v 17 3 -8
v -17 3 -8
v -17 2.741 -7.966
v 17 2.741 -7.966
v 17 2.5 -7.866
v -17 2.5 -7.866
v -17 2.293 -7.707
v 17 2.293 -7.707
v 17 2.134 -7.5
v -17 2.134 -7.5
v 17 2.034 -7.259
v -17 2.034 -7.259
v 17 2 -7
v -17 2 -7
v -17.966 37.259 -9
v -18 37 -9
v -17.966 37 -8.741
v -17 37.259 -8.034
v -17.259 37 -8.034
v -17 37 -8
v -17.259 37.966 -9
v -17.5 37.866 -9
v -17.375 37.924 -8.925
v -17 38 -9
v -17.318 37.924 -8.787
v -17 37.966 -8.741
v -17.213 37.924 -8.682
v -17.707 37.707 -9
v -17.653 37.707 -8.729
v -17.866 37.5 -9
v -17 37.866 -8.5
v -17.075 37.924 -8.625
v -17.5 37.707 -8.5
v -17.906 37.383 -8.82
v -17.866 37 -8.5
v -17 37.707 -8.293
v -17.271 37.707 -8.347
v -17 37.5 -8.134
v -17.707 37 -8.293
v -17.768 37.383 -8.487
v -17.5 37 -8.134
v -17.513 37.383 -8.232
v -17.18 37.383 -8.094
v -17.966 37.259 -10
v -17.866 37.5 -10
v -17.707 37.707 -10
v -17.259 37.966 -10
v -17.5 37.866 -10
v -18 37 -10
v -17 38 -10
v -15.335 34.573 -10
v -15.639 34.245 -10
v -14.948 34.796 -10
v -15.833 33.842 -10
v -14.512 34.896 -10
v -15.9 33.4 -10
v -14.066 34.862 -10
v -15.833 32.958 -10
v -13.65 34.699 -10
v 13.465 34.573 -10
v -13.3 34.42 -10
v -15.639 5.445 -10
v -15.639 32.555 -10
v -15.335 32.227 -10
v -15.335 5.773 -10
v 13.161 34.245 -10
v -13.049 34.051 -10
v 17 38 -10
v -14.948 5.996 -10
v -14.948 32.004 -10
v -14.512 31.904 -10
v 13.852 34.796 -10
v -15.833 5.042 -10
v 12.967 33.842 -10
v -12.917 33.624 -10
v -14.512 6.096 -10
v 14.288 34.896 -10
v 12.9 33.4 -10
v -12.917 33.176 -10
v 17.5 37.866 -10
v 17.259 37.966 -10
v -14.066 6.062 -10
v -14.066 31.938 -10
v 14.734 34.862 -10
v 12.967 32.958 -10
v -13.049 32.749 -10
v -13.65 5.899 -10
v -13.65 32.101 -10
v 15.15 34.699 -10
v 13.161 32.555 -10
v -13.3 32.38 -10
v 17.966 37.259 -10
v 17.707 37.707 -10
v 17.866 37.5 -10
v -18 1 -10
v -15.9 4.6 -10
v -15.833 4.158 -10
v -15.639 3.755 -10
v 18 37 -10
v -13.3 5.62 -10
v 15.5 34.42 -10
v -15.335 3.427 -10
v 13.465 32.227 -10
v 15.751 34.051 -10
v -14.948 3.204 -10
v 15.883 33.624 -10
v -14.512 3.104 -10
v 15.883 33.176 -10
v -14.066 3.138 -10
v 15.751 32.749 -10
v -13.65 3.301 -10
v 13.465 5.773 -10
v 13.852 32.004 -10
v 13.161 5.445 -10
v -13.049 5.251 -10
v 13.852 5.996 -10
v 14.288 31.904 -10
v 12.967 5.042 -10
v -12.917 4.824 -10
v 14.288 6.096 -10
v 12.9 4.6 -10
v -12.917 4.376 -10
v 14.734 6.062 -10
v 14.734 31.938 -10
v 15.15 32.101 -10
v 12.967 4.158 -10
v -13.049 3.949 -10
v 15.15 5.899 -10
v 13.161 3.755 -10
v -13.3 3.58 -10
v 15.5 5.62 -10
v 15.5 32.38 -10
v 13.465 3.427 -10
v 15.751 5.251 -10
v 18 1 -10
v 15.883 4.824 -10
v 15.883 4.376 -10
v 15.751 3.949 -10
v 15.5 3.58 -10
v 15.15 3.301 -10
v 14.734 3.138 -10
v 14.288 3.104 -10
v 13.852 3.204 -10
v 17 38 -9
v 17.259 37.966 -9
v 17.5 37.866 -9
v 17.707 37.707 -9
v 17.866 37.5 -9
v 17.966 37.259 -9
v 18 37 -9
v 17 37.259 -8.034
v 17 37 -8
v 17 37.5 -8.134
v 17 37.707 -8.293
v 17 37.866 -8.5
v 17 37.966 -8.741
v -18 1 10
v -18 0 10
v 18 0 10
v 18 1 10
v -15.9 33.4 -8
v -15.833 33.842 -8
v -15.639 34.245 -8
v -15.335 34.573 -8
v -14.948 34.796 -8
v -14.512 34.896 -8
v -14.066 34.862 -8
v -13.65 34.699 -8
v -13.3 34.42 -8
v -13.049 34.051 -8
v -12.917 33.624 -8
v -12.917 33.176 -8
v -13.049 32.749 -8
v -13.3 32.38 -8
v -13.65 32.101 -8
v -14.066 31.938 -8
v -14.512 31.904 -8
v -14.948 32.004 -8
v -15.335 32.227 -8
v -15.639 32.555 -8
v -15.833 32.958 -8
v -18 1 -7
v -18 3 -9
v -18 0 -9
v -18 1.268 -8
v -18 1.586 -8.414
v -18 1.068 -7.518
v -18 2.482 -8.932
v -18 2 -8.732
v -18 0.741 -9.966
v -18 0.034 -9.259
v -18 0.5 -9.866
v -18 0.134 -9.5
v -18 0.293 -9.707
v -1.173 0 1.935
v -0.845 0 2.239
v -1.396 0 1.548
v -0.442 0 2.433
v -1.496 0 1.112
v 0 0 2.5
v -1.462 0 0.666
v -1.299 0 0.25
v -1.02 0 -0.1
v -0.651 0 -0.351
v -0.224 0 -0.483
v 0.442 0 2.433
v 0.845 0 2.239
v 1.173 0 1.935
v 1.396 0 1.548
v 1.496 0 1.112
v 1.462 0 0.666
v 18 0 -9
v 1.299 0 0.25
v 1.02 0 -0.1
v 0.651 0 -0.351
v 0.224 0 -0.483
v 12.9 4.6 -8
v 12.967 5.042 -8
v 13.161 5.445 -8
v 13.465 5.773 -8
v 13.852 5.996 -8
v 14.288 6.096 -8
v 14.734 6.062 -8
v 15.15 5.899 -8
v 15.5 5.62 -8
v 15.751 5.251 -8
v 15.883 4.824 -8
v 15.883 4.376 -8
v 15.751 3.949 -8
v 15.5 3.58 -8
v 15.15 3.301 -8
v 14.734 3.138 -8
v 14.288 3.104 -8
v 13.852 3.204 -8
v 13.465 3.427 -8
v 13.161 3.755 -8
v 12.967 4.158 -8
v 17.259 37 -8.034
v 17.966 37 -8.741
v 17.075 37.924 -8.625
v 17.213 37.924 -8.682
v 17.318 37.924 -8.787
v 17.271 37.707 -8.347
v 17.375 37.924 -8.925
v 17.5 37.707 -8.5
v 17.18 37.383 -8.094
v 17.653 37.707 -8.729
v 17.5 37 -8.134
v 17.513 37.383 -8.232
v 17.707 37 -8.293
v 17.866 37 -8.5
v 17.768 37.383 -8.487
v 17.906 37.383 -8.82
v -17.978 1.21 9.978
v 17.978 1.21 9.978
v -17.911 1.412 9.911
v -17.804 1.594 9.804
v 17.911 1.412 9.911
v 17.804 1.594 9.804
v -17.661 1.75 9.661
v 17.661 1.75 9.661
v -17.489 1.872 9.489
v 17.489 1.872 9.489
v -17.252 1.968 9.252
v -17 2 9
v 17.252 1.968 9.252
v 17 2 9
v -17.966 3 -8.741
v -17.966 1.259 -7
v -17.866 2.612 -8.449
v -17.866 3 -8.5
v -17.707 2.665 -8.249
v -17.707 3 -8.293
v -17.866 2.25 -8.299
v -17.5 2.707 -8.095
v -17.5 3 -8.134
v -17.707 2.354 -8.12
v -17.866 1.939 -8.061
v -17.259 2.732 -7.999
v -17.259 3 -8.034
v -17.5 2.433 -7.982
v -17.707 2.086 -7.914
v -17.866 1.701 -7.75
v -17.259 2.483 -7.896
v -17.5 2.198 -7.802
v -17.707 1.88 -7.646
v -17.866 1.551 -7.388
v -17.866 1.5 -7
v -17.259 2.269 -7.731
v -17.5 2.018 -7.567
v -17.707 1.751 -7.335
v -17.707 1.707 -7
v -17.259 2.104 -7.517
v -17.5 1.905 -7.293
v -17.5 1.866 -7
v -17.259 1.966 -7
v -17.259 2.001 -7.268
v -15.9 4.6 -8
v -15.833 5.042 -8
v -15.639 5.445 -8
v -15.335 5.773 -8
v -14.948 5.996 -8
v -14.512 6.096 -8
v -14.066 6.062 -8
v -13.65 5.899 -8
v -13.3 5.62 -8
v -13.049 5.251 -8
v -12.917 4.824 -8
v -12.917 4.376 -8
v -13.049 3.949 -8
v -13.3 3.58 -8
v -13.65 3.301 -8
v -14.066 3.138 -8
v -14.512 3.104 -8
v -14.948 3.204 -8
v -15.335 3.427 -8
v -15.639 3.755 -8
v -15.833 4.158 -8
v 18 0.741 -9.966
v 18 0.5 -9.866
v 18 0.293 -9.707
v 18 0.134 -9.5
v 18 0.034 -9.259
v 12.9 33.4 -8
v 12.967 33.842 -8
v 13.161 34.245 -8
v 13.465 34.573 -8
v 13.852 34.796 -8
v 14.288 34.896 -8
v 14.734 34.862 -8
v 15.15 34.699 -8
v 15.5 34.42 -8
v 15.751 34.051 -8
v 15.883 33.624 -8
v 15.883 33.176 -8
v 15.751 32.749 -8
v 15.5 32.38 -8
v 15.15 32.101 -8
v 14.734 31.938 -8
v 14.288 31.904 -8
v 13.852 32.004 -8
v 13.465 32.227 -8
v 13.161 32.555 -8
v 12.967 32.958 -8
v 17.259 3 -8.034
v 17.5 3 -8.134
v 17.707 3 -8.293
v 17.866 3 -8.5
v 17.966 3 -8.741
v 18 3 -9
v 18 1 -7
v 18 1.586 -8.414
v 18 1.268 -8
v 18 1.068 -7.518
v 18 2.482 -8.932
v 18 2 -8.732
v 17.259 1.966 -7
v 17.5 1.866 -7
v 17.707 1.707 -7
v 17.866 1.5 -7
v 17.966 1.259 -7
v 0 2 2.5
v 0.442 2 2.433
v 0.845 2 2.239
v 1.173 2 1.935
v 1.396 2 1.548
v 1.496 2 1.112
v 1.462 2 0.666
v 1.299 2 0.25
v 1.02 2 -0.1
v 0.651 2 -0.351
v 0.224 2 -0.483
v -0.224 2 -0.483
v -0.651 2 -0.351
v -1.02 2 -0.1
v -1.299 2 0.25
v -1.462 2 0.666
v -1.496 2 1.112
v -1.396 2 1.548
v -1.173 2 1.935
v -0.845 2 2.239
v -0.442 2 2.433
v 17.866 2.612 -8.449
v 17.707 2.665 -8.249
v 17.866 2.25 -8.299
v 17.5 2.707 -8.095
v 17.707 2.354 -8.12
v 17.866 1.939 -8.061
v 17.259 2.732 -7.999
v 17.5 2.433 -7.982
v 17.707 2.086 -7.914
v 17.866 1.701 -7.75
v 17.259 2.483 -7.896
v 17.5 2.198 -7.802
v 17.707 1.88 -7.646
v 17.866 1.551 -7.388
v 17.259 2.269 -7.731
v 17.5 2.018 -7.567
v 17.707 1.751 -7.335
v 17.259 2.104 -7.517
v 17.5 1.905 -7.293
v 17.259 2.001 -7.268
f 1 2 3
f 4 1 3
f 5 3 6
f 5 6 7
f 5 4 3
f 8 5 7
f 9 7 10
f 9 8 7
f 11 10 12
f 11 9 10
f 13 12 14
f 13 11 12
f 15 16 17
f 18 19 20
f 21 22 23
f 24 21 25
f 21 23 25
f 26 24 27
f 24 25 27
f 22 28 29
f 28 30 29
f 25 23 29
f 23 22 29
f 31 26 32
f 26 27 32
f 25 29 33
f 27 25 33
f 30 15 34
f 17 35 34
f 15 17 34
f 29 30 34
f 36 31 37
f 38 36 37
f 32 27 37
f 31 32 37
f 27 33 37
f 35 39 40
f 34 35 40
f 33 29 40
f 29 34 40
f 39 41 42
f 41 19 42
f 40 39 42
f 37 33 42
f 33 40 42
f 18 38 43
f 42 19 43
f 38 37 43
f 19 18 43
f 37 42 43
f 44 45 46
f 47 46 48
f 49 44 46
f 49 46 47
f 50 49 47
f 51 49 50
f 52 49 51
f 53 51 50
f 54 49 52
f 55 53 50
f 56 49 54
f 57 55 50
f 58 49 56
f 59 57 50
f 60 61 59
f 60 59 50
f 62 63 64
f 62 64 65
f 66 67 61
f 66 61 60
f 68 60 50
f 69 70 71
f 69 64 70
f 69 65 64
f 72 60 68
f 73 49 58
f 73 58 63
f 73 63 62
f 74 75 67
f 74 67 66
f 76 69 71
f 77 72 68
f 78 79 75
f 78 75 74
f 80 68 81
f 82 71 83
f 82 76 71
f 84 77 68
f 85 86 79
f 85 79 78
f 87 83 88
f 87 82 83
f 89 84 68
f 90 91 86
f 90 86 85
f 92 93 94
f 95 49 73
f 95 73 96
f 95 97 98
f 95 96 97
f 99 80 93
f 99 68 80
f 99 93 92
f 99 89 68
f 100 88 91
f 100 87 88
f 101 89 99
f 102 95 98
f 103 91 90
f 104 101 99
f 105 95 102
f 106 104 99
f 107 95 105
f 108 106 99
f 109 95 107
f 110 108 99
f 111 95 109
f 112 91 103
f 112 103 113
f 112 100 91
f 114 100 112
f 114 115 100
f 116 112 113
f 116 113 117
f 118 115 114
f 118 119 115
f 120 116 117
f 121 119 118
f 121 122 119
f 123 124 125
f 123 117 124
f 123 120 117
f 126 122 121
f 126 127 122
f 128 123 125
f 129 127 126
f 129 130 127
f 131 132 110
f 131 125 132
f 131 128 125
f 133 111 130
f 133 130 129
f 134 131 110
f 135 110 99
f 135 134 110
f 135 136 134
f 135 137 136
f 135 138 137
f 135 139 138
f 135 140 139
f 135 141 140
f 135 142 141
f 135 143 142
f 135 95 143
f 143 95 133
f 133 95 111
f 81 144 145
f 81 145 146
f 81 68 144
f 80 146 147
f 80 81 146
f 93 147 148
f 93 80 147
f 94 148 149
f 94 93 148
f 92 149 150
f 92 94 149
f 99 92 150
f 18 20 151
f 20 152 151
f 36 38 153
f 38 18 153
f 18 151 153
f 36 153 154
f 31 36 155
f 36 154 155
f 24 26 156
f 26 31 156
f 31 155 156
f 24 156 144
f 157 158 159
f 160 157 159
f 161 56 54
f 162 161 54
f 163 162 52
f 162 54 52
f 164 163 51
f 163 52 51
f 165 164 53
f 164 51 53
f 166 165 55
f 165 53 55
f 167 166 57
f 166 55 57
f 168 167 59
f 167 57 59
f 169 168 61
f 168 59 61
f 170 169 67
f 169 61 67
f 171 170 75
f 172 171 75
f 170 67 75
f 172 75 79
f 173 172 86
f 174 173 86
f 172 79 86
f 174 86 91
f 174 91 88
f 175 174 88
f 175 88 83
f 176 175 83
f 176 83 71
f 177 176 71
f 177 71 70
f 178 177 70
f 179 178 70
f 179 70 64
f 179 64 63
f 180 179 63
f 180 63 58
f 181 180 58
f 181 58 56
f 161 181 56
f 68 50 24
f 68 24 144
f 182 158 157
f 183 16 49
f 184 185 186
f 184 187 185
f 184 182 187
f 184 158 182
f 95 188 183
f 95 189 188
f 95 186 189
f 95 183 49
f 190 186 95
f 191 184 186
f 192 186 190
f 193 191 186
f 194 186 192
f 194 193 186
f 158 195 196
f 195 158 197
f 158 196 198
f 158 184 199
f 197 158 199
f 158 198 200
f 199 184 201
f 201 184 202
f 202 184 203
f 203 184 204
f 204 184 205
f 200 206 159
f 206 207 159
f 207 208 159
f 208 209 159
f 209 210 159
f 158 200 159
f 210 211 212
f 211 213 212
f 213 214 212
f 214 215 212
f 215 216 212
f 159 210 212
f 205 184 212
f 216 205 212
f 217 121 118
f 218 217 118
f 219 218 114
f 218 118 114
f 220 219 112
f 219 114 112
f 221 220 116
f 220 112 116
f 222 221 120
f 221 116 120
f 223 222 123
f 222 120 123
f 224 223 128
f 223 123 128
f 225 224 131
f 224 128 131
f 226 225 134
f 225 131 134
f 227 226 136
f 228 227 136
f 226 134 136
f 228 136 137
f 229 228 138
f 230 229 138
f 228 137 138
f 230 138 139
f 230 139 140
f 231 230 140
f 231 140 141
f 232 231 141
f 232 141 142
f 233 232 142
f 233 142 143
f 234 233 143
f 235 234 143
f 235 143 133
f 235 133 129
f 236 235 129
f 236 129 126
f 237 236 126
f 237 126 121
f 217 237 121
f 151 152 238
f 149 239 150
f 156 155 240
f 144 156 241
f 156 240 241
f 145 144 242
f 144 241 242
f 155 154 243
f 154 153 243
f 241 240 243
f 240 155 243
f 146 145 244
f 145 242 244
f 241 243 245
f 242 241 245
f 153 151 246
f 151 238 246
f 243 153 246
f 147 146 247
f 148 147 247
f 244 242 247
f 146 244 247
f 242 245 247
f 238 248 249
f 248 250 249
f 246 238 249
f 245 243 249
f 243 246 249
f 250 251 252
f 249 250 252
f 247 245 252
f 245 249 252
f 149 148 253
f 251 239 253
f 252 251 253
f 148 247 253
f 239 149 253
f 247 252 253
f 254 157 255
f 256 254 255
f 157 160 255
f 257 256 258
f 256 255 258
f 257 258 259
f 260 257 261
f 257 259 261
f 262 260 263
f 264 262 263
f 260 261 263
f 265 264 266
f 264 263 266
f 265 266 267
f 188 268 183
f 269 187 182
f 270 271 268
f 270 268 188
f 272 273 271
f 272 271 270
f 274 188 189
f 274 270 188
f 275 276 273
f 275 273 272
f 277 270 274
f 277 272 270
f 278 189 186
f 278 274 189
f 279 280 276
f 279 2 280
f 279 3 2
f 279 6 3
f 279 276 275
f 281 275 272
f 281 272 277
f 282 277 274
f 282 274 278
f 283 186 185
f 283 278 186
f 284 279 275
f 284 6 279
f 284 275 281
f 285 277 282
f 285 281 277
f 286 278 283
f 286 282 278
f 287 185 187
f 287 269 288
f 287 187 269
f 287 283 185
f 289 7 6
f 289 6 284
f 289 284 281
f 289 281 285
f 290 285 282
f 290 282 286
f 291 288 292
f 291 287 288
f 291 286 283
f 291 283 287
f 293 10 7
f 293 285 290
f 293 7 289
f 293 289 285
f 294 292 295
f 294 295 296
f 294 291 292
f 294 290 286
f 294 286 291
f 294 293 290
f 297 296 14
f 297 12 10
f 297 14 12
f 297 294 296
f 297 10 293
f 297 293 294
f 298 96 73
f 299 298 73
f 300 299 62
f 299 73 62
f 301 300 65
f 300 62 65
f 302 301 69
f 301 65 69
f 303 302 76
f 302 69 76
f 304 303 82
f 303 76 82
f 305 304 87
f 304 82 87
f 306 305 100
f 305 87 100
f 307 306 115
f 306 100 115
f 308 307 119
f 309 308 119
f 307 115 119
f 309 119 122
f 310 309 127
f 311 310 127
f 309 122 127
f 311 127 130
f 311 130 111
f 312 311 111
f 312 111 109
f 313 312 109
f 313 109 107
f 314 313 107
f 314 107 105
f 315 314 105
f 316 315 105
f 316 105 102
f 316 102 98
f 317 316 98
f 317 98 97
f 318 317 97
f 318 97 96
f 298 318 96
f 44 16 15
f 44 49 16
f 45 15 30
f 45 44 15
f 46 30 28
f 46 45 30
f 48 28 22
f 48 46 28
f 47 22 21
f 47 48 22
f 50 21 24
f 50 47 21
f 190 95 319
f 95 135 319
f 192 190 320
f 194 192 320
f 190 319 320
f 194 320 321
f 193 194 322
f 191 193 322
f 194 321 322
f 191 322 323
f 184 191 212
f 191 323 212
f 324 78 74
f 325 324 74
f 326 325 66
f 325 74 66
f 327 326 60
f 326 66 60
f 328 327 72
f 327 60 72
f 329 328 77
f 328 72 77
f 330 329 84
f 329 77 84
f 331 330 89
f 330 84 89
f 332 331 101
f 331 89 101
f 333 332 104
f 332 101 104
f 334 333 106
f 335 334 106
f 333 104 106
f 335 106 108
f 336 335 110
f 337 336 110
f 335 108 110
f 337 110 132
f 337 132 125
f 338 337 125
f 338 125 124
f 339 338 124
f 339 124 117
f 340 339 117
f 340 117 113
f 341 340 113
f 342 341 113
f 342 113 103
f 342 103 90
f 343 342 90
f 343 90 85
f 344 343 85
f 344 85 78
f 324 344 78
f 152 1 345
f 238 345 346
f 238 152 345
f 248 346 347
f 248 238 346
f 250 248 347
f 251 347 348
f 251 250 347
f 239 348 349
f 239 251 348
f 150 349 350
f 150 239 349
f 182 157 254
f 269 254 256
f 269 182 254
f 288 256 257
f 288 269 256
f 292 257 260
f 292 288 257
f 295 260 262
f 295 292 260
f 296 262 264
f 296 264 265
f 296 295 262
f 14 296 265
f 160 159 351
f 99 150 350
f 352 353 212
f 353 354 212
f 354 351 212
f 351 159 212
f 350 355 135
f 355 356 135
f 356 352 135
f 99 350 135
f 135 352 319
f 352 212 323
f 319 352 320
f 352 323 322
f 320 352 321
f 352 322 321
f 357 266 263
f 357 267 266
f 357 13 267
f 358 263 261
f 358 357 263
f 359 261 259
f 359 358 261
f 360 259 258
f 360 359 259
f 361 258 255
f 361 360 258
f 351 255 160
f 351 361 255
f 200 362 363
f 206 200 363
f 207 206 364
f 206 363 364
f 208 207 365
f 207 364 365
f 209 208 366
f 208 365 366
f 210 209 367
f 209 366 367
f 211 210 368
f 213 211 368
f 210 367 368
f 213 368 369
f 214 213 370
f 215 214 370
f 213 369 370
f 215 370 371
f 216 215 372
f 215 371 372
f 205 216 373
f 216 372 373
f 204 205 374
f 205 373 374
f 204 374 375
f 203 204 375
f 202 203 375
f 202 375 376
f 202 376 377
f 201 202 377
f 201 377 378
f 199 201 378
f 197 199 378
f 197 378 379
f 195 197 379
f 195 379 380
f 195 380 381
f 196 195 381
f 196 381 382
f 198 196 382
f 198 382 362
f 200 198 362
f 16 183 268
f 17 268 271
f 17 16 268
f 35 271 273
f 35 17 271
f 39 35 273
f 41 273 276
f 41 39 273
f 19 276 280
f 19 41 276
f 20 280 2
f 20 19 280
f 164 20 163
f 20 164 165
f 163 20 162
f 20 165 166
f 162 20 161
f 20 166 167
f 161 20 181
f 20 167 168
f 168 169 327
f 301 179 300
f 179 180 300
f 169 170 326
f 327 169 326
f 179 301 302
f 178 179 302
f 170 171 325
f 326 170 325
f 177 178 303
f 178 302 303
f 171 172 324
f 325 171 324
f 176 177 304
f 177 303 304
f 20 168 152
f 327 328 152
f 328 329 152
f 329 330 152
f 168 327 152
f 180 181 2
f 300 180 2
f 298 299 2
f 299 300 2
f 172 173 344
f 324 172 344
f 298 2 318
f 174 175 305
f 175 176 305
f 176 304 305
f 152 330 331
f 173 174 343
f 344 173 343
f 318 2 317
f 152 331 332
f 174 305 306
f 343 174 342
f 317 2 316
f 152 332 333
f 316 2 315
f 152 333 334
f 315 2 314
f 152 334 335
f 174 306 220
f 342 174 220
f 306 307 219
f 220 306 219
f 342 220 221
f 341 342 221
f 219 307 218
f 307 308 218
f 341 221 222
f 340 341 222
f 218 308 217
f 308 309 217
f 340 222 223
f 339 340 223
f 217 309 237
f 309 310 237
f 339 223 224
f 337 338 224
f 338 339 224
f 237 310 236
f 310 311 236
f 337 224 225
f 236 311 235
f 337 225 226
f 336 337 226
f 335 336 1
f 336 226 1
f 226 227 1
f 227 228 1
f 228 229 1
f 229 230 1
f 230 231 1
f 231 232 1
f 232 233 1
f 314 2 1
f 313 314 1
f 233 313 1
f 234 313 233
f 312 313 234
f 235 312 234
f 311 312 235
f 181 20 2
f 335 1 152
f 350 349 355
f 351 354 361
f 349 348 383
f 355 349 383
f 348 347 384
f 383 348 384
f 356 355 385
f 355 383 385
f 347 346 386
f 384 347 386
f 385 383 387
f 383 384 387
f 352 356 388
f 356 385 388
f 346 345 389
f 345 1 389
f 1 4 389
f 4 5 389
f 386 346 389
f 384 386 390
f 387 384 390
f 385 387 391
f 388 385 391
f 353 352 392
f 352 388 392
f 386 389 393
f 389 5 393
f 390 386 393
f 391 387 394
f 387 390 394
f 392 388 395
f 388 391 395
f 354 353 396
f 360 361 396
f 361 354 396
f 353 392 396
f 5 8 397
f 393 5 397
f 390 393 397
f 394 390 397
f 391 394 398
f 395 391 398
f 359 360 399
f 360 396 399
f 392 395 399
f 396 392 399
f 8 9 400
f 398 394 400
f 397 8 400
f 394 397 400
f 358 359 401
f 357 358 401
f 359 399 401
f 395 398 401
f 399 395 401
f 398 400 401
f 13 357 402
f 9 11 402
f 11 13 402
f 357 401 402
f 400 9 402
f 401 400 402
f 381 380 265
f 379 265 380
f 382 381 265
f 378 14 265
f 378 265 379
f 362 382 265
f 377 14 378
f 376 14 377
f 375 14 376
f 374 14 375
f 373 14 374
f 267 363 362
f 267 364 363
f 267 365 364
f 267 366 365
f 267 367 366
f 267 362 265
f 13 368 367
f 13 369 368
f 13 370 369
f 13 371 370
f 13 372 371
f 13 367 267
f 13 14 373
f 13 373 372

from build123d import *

# Parameters (mm, degrees)
SKETCH1_W           = 36
SKETCH1_H           = 20
BOSS_EXTRUDE1_DEPTH = 2
SKETCH2_W           = 36
SKETCH2_H           = 2
BOSS_EXTRUDE2_DEPTH = 36
CUT_EXTRUDE1_REACH  = 48.562
SKETCH3_R           = 1.5
CUT_EXTRUDE3_REACH  = 43.473
SKETCH4_R           = 1.5
FILLET1_R           = 1


with BuildPart() as part:
    # Sketch1 → Boss-Extrude1 (new body)
    with BuildSketch(Plane(origin=(0, 0, 0), x_dir=(1, 0, 0), z_dir=(0, 1, 0))):
        Rectangle(SKETCH1_W, SKETCH1_H)
    extrude(amount=BOSS_EXTRUDE1_DEPTH)

    # Sketch2 → Boss-Extrude2 (add)
    with BuildSketch(Plane(origin=(0, 2, 0), x_dir=(1, 0, 0), z_dir=(0, 1, 0))):
        with Locations((0, 9)):
            Rectangle(SKETCH2_W, SKETCH2_H)
    extrude(amount=BOSS_EXTRUDE2_DEPTH)

    # Sketch3 → Cut-Extrude1 (cut, up to next)
    with BuildSketch(Plane(origin=(0, 0, -10), x_dir=(-1, 0, 0), z_dir=(0, 0, -1)), mode=Mode.PRIVATE) as cut_extrude1_sk1:
        with Locations((-14.4, 33.4)):
            Circle(SKETCH3_R)
    cut_extrude1_tool1 = extrude(cut_extrude1_sk1.sketch, amount=-CUT_EXTRUDE1_REACH, mode=Mode.PRIVATE) & part.part
    # Sketch3 → Cut-Extrude1 (cut, up to next)
    with BuildSketch(Plane(origin=(0, 0, -10), x_dir=(-1, 0, 0), z_dir=(0, 0, -1)), mode=Mode.PRIVATE) as cut_extrude1_sk2:
        with Locations((14.4, 33.4)):
            Circle(SKETCH3_R)
    cut_extrude1_tool2 = extrude(cut_extrude1_sk2.sketch, amount=-CUT_EXTRUDE1_REACH, mode=Mode.PRIVATE) & part.part
    # Sketch3 → Cut-Extrude1 (cut, up to next)
    with BuildSketch(Plane(origin=(0, 0, -10), x_dir=(-1, 0, 0), z_dir=(0, 0, -1)), mode=Mode.PRIVATE) as cut_extrude1_sk3:
        with Locations((14.4, 4.6)):
            Circle(SKETCH3_R)
    cut_extrude1_tool3 = extrude(cut_extrude1_sk3.sketch, amount=-CUT_EXTRUDE1_REACH, mode=Mode.PRIVATE) & part.part
    # Sketch3 → Cut-Extrude1 (cut, up to next)
    with BuildSketch(Plane(origin=(0, 0, -10), x_dir=(-1, 0, 0), z_dir=(0, 0, -1)), mode=Mode.PRIVATE) as cut_extrude1_sk4:
        with Locations((-14.4, 4.6)):
            Circle(SKETCH3_R)
    cut_extrude1_tool4 = extrude(cut_extrude1_sk4.sketch, amount=-CUT_EXTRUDE1_REACH, mode=Mode.PRIVATE) & part.part
    add(cut_extrude1_tool1.solids().sort_by_distance((14.4, 33.4, -10))[0], mode=Mode.SUBTRACT)
    add(cut_extrude1_tool2.solids().sort_by_distance((-14.4, 33.4, -10))[0], mode=Mode.SUBTRACT)
    add(cut_extrude1_tool3.solids().sort_by_distance((-14.4, 4.6, -10))[0], mode=Mode.SUBTRACT)
    add(cut_extrude1_tool4.solids().sort_by_distance((14.4, 4.6, -10))[0], mode=Mode.SUBTRACT)

    # Sketch4 → Cut-Extrude3 (cut, up to next)
    with BuildSketch(Plane(origin=(0, 2, 0), x_dir=(1, 0, 0), z_dir=(0, 1, 0)), mode=Mode.PRIVATE) as cut_extrude3_sk1:
        with Locations(Location((0, -1, 0), (0, 0, 270))):
            Circle(SKETCH4_R)
    cut_extrude3_tool1 = extrude(cut_extrude3_sk1.sketch, amount=-CUT_EXTRUDE3_REACH, mode=Mode.PRIVATE) & part.part
    add(cut_extrude3_tool1.solids().sort_by_distance((0, 2, 1))[0], mode=Mode.SUBTRACT)

    # Fillet1
    fillet1_edges = [part.edges().sort_by_distance(p)[0] for p in [
        (0, 2, 10),
        (-18, 2, 1),
        (0, 2, -8),
        (-18, 20, -8),
        (18, 20, -8),
        (-18, 38, -9),
        (0, 38, -8),
        (18, 38, -9),
        (18, 2, 1),
        (0, 0, -10),
    ]]
    fillet(fillet1_edges, radius=FILLET1_R)


solid = part.part
